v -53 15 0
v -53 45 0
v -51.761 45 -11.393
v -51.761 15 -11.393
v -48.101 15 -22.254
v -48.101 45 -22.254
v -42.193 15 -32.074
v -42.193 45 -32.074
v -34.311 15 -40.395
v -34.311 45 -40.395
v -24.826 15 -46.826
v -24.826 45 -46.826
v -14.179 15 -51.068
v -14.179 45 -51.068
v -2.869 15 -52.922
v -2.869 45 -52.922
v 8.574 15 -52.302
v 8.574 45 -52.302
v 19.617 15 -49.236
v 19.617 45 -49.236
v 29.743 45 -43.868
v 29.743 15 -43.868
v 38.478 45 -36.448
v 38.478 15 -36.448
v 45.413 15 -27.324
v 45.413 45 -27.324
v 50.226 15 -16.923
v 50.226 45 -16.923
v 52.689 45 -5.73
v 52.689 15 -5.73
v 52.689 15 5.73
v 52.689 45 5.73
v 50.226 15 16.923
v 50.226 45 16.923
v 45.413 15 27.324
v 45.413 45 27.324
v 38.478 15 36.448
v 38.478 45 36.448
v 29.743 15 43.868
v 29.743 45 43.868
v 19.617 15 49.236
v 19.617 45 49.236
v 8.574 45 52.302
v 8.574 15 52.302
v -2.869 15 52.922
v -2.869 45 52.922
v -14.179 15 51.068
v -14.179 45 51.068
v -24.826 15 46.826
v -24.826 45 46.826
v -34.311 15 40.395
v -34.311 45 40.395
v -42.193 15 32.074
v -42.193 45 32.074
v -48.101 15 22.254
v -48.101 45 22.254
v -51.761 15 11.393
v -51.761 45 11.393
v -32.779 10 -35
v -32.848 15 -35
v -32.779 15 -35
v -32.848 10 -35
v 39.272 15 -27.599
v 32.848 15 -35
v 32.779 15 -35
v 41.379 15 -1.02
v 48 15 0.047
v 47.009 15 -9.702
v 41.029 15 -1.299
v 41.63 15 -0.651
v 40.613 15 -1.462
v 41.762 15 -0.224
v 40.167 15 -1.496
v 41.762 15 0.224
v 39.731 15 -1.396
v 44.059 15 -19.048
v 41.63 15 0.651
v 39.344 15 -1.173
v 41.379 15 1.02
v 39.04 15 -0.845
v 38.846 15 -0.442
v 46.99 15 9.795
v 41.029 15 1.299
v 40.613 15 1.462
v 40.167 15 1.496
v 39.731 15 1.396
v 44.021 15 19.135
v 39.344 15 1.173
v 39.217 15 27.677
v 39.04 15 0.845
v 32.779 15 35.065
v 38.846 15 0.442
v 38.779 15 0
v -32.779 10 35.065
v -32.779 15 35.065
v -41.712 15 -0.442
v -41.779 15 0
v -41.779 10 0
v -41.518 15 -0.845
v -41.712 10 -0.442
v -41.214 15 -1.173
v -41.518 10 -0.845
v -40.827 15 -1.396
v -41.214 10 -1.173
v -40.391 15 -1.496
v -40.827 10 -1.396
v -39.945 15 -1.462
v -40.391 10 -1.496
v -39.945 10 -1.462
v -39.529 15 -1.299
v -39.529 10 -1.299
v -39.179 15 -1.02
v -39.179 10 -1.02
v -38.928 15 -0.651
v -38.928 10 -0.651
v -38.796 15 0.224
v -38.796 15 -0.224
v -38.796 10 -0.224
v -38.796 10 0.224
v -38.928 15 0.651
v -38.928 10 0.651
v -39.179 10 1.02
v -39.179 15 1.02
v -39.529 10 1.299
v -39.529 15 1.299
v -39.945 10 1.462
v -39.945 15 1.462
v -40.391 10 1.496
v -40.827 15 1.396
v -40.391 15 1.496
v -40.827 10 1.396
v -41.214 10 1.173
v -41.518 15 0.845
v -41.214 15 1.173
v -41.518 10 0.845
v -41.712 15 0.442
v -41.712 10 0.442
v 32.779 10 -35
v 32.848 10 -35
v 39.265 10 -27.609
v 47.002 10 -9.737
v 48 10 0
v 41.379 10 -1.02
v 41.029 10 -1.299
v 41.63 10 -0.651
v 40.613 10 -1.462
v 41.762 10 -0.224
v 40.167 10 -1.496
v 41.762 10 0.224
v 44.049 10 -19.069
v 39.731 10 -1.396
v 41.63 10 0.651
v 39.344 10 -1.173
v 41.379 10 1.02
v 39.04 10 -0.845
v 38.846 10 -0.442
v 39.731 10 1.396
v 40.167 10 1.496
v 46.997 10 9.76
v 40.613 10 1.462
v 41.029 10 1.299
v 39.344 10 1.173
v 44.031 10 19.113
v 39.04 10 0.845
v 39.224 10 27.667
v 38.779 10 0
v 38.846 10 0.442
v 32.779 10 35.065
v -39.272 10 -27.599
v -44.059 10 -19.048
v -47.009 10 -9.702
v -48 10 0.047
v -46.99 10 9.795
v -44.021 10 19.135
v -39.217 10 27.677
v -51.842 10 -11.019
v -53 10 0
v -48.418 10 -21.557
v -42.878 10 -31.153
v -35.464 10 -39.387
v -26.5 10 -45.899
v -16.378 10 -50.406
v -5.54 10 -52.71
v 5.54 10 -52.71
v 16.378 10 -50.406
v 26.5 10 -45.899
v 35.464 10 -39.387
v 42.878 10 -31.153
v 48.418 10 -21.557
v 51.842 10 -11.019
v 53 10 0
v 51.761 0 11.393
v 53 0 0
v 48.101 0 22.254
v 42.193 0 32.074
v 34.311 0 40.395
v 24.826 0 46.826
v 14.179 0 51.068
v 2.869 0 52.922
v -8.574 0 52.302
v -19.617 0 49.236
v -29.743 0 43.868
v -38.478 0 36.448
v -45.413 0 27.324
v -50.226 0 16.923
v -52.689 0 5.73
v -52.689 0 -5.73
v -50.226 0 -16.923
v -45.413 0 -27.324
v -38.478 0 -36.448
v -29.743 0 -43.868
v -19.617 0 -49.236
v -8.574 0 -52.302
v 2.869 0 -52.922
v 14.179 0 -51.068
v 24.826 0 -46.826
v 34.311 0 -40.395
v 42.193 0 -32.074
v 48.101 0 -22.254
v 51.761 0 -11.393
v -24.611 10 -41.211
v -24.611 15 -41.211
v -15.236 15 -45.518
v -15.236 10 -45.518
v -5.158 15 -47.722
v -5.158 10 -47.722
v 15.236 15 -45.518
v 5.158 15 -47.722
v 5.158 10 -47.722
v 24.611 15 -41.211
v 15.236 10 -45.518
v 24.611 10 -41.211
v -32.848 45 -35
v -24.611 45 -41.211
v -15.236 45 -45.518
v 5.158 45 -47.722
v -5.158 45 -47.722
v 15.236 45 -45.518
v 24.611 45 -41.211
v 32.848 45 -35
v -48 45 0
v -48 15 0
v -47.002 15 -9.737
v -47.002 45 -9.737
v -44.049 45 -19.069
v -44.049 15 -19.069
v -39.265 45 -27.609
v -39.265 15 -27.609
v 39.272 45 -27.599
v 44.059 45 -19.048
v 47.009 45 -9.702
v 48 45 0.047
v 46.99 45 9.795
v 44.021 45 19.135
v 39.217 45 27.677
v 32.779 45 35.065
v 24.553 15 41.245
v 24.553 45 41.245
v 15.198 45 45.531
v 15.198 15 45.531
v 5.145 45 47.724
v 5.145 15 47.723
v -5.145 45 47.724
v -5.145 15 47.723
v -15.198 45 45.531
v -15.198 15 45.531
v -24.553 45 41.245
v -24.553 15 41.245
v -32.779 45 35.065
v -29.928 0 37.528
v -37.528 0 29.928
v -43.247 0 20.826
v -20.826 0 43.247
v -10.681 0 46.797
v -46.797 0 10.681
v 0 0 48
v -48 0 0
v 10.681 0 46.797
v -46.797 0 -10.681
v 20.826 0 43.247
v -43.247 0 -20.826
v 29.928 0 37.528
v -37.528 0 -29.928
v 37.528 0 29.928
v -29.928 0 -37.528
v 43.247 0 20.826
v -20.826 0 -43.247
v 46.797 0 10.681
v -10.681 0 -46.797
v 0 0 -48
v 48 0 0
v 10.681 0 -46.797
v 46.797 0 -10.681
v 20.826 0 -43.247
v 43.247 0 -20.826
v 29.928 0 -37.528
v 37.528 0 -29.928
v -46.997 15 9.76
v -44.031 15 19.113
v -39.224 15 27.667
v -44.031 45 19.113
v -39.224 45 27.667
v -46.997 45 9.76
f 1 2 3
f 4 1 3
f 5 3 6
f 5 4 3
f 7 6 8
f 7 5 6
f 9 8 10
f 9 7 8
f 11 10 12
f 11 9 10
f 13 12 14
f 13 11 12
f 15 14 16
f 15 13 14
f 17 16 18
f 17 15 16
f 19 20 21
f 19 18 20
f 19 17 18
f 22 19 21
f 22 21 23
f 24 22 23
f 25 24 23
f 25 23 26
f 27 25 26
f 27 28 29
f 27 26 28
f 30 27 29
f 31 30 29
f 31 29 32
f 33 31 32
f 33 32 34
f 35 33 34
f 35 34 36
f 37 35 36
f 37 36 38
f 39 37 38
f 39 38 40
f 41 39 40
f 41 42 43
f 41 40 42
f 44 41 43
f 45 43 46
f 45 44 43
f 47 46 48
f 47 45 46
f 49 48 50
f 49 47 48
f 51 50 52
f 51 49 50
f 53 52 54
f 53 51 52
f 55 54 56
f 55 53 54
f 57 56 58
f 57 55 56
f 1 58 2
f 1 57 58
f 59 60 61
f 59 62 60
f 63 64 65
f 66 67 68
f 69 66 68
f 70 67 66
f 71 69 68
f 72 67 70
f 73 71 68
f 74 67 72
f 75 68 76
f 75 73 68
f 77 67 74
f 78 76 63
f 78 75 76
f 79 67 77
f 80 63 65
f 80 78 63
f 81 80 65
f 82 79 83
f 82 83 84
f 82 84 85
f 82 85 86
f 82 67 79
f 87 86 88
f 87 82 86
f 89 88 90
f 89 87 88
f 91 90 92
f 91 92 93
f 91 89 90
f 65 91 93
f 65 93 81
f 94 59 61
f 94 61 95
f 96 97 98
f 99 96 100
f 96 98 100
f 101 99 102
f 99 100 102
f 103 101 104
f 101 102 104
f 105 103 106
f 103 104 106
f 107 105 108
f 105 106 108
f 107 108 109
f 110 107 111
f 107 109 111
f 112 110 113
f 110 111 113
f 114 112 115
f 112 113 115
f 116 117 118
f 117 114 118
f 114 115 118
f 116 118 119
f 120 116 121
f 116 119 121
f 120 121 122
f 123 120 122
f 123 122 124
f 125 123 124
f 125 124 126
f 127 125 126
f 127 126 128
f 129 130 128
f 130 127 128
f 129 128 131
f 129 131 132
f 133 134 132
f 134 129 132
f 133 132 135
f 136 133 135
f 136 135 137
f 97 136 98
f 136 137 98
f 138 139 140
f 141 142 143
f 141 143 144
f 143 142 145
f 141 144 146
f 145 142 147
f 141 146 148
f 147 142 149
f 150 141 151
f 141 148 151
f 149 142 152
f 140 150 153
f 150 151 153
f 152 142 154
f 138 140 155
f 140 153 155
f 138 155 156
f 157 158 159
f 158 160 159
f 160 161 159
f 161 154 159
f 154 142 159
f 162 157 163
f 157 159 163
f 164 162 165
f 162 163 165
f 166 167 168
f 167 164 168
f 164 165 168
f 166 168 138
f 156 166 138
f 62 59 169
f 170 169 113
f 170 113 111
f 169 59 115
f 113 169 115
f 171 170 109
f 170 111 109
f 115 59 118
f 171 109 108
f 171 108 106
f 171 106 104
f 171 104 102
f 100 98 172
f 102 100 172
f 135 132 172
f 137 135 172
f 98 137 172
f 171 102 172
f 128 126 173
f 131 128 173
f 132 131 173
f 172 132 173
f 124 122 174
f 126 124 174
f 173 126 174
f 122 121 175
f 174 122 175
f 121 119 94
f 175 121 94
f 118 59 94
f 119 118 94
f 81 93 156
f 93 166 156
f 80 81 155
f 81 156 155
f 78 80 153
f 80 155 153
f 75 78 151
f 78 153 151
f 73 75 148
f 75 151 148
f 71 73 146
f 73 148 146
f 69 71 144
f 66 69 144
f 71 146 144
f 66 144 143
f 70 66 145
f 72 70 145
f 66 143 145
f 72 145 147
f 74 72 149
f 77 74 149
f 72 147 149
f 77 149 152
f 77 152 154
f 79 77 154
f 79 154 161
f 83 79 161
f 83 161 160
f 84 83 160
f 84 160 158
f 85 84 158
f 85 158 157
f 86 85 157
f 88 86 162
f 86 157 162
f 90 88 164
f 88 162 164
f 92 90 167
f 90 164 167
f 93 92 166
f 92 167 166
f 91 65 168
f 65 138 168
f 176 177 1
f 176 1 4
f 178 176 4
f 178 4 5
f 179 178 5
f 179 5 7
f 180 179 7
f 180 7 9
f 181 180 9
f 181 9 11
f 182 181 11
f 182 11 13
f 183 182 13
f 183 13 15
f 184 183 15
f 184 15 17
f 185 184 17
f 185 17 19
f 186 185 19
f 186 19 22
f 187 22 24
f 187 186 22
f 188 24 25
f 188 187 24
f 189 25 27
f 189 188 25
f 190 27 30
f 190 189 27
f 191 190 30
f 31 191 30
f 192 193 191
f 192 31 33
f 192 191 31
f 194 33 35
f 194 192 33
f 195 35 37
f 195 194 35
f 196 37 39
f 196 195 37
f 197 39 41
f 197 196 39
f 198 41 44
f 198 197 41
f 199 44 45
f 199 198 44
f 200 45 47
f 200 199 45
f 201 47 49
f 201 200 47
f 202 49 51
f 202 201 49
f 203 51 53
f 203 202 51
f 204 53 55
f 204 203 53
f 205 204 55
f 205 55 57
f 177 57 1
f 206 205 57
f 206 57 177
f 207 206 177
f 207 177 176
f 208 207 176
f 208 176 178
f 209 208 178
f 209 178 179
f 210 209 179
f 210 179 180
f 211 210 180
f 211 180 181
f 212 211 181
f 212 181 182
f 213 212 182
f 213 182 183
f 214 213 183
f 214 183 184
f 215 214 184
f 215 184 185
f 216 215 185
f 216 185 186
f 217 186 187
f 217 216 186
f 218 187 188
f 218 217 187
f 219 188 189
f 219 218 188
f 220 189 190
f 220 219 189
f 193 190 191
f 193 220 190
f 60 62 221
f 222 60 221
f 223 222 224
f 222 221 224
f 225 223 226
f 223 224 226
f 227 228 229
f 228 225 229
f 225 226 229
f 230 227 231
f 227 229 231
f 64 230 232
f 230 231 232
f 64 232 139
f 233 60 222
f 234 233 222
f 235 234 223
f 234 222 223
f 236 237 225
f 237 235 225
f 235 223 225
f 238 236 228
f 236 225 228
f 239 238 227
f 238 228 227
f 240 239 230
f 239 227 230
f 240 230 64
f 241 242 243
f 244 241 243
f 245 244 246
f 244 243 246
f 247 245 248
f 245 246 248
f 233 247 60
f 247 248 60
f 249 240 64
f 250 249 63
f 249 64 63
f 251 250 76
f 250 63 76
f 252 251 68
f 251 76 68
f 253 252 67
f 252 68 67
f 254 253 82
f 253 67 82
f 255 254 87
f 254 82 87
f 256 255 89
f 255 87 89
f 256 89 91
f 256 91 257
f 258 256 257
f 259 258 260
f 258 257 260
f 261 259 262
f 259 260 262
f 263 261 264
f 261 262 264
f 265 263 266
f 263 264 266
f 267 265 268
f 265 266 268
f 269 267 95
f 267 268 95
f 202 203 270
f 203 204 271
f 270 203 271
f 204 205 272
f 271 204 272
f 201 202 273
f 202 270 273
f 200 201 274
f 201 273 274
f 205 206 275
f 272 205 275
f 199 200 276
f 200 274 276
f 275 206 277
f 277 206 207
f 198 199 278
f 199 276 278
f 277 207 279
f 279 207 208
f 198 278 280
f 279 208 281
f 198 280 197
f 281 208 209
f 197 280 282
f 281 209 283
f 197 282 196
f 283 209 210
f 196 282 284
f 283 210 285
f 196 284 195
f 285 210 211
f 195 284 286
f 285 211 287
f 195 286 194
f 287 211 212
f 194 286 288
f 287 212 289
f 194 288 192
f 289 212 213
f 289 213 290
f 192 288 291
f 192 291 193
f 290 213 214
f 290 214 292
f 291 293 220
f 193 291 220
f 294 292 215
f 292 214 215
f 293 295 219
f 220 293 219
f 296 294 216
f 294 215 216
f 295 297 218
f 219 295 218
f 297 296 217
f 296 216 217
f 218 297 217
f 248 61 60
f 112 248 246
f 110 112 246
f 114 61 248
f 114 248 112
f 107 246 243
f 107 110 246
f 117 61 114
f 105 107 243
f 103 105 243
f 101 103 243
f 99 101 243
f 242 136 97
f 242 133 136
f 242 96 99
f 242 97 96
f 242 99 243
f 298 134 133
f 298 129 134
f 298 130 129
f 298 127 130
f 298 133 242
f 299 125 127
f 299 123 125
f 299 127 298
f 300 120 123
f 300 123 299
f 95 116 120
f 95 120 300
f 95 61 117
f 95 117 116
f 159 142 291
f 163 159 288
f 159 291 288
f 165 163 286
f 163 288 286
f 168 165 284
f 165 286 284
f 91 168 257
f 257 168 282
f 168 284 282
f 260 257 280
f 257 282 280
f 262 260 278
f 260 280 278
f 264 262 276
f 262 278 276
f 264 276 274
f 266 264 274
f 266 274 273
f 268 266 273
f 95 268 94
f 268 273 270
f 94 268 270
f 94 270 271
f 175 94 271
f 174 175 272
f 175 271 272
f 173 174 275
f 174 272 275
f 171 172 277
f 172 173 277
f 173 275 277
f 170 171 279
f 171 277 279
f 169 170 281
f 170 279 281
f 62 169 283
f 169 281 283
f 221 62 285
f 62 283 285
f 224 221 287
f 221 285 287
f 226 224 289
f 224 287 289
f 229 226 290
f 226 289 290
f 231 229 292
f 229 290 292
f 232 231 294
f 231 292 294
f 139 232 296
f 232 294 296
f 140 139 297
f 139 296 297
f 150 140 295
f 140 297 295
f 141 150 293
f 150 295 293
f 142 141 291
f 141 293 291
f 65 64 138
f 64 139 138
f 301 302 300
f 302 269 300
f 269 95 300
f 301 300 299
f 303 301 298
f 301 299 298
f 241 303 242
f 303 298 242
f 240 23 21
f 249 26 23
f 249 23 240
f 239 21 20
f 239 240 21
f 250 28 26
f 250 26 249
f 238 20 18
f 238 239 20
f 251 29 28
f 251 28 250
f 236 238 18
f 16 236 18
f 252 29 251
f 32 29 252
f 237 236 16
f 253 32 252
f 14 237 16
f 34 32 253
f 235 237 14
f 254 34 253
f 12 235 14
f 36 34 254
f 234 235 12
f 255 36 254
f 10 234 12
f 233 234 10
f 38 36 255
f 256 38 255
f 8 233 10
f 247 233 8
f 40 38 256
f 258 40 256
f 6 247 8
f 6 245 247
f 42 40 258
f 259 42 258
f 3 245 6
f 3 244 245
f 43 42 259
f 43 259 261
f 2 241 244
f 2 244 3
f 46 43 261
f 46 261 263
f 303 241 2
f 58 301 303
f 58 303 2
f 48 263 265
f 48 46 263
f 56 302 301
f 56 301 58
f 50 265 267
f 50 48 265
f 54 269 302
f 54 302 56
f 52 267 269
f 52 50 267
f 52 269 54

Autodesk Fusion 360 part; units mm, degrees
sketch "Sketch1" plane through (0, 0, 0) normal (0, 1, 0) x (1, 0, 0)
  circle A0 centre (0, 0) radius 48
  circle A1 centre (0, 0) radius 53
  dimension "d1" = 96
  dimension "d2" = 106
extrude "Extrude4" add sketch "Sketch1" along normal blind 10
sketch "Sketch4" plane through (0, 10, 0) normal (0, 1, 0) x (-1, 0, 0)
  circle A0 centre (0, 0) radius 48
  circle A1 centre (0, 0) radius 53
  line L0 (48, 0) -> (41.779, 0)
  line L1 (48, 0) -> (32.779, 0)
  circle A2 centre (40.279, 0) radius 1.5
  line L2 (-48, 0) -> (-32.779, 0)
  line L3 (-48, 0) -> (-41.779, 0)
  circle A3 centre (-40.279, 0) radius 1.5
  line L4 (32.779, 35.0648) -> (49, 35.0648)
  line L5 (49, 35.0648) -> (49, -35)
  line L6 (49, -35) -> (32.779, -35)
  line L7 (32.779, -35) -> (32.779, 35.0648)
  line L8 (-32.779, 35.0648) -> (-52, 35.0648)
  line L9 (-52, 35.0648) -> (-52, -35)
  line L10 (-52, -35) -> (-32.779, -35)
  line L11 (-32.779, -35) -> (-32.779, 35.0648)
  dimension "d13" = 6.221
  dimension "d14" = 15.221
  dimension "d15" = 3
  dimension "d16" = 15.221
  dimension "d17" = 6.221
  dimension "d18" = 3
extrude "Extrude5" add sketch "Sketch4" along normal blind 5 contours A0 L0 L1 A2 L7 | A0 A1 L4 L5 L6 | A0 L0 L1 A2 L6 L7 | A0 A1 L4 L8 | A0 A1 L6 L10 | A0 L2 L3 A3 L11 | A0 A1 L8 L9 L10 | A0 L2 L3 A3 L10 L11 | A1 L5 | A1 L9
sketch "Sketch5" plane through (0, 15, 0) normal (0, 1, 0) x (-1, 0, 0)
  circle A0 centre (40.279, 0) radius 1.5
  arc A1 (-32.8481, -35) -> (32.8481, -35) centre (0, 0) ccw
  line L0 (-32.8481, -35) -> (-32.779, -35)
  line L1 (-32.779, -35) -> (-32.779, 35.0648)
  arc A2 (32.779, 35.0648) -> (-32.779, 35.0648) centre (0, 0) ccw
  line L2 (32.779, 35.0648) -> (32.779, -35)
  line L3 (32.779, -35) -> (32.8481, -35)
  circle A3 centre (-40.279, 0) radius 1.5
  circle A4 centre (0, 0) radius 53
  circle A5 centre (0, 0) radius 48
extrude "Extrude6" add sketch "Sketch5" along normal blind 30 contours A4
thread "Thread1" thread offset 0 thread length 10
